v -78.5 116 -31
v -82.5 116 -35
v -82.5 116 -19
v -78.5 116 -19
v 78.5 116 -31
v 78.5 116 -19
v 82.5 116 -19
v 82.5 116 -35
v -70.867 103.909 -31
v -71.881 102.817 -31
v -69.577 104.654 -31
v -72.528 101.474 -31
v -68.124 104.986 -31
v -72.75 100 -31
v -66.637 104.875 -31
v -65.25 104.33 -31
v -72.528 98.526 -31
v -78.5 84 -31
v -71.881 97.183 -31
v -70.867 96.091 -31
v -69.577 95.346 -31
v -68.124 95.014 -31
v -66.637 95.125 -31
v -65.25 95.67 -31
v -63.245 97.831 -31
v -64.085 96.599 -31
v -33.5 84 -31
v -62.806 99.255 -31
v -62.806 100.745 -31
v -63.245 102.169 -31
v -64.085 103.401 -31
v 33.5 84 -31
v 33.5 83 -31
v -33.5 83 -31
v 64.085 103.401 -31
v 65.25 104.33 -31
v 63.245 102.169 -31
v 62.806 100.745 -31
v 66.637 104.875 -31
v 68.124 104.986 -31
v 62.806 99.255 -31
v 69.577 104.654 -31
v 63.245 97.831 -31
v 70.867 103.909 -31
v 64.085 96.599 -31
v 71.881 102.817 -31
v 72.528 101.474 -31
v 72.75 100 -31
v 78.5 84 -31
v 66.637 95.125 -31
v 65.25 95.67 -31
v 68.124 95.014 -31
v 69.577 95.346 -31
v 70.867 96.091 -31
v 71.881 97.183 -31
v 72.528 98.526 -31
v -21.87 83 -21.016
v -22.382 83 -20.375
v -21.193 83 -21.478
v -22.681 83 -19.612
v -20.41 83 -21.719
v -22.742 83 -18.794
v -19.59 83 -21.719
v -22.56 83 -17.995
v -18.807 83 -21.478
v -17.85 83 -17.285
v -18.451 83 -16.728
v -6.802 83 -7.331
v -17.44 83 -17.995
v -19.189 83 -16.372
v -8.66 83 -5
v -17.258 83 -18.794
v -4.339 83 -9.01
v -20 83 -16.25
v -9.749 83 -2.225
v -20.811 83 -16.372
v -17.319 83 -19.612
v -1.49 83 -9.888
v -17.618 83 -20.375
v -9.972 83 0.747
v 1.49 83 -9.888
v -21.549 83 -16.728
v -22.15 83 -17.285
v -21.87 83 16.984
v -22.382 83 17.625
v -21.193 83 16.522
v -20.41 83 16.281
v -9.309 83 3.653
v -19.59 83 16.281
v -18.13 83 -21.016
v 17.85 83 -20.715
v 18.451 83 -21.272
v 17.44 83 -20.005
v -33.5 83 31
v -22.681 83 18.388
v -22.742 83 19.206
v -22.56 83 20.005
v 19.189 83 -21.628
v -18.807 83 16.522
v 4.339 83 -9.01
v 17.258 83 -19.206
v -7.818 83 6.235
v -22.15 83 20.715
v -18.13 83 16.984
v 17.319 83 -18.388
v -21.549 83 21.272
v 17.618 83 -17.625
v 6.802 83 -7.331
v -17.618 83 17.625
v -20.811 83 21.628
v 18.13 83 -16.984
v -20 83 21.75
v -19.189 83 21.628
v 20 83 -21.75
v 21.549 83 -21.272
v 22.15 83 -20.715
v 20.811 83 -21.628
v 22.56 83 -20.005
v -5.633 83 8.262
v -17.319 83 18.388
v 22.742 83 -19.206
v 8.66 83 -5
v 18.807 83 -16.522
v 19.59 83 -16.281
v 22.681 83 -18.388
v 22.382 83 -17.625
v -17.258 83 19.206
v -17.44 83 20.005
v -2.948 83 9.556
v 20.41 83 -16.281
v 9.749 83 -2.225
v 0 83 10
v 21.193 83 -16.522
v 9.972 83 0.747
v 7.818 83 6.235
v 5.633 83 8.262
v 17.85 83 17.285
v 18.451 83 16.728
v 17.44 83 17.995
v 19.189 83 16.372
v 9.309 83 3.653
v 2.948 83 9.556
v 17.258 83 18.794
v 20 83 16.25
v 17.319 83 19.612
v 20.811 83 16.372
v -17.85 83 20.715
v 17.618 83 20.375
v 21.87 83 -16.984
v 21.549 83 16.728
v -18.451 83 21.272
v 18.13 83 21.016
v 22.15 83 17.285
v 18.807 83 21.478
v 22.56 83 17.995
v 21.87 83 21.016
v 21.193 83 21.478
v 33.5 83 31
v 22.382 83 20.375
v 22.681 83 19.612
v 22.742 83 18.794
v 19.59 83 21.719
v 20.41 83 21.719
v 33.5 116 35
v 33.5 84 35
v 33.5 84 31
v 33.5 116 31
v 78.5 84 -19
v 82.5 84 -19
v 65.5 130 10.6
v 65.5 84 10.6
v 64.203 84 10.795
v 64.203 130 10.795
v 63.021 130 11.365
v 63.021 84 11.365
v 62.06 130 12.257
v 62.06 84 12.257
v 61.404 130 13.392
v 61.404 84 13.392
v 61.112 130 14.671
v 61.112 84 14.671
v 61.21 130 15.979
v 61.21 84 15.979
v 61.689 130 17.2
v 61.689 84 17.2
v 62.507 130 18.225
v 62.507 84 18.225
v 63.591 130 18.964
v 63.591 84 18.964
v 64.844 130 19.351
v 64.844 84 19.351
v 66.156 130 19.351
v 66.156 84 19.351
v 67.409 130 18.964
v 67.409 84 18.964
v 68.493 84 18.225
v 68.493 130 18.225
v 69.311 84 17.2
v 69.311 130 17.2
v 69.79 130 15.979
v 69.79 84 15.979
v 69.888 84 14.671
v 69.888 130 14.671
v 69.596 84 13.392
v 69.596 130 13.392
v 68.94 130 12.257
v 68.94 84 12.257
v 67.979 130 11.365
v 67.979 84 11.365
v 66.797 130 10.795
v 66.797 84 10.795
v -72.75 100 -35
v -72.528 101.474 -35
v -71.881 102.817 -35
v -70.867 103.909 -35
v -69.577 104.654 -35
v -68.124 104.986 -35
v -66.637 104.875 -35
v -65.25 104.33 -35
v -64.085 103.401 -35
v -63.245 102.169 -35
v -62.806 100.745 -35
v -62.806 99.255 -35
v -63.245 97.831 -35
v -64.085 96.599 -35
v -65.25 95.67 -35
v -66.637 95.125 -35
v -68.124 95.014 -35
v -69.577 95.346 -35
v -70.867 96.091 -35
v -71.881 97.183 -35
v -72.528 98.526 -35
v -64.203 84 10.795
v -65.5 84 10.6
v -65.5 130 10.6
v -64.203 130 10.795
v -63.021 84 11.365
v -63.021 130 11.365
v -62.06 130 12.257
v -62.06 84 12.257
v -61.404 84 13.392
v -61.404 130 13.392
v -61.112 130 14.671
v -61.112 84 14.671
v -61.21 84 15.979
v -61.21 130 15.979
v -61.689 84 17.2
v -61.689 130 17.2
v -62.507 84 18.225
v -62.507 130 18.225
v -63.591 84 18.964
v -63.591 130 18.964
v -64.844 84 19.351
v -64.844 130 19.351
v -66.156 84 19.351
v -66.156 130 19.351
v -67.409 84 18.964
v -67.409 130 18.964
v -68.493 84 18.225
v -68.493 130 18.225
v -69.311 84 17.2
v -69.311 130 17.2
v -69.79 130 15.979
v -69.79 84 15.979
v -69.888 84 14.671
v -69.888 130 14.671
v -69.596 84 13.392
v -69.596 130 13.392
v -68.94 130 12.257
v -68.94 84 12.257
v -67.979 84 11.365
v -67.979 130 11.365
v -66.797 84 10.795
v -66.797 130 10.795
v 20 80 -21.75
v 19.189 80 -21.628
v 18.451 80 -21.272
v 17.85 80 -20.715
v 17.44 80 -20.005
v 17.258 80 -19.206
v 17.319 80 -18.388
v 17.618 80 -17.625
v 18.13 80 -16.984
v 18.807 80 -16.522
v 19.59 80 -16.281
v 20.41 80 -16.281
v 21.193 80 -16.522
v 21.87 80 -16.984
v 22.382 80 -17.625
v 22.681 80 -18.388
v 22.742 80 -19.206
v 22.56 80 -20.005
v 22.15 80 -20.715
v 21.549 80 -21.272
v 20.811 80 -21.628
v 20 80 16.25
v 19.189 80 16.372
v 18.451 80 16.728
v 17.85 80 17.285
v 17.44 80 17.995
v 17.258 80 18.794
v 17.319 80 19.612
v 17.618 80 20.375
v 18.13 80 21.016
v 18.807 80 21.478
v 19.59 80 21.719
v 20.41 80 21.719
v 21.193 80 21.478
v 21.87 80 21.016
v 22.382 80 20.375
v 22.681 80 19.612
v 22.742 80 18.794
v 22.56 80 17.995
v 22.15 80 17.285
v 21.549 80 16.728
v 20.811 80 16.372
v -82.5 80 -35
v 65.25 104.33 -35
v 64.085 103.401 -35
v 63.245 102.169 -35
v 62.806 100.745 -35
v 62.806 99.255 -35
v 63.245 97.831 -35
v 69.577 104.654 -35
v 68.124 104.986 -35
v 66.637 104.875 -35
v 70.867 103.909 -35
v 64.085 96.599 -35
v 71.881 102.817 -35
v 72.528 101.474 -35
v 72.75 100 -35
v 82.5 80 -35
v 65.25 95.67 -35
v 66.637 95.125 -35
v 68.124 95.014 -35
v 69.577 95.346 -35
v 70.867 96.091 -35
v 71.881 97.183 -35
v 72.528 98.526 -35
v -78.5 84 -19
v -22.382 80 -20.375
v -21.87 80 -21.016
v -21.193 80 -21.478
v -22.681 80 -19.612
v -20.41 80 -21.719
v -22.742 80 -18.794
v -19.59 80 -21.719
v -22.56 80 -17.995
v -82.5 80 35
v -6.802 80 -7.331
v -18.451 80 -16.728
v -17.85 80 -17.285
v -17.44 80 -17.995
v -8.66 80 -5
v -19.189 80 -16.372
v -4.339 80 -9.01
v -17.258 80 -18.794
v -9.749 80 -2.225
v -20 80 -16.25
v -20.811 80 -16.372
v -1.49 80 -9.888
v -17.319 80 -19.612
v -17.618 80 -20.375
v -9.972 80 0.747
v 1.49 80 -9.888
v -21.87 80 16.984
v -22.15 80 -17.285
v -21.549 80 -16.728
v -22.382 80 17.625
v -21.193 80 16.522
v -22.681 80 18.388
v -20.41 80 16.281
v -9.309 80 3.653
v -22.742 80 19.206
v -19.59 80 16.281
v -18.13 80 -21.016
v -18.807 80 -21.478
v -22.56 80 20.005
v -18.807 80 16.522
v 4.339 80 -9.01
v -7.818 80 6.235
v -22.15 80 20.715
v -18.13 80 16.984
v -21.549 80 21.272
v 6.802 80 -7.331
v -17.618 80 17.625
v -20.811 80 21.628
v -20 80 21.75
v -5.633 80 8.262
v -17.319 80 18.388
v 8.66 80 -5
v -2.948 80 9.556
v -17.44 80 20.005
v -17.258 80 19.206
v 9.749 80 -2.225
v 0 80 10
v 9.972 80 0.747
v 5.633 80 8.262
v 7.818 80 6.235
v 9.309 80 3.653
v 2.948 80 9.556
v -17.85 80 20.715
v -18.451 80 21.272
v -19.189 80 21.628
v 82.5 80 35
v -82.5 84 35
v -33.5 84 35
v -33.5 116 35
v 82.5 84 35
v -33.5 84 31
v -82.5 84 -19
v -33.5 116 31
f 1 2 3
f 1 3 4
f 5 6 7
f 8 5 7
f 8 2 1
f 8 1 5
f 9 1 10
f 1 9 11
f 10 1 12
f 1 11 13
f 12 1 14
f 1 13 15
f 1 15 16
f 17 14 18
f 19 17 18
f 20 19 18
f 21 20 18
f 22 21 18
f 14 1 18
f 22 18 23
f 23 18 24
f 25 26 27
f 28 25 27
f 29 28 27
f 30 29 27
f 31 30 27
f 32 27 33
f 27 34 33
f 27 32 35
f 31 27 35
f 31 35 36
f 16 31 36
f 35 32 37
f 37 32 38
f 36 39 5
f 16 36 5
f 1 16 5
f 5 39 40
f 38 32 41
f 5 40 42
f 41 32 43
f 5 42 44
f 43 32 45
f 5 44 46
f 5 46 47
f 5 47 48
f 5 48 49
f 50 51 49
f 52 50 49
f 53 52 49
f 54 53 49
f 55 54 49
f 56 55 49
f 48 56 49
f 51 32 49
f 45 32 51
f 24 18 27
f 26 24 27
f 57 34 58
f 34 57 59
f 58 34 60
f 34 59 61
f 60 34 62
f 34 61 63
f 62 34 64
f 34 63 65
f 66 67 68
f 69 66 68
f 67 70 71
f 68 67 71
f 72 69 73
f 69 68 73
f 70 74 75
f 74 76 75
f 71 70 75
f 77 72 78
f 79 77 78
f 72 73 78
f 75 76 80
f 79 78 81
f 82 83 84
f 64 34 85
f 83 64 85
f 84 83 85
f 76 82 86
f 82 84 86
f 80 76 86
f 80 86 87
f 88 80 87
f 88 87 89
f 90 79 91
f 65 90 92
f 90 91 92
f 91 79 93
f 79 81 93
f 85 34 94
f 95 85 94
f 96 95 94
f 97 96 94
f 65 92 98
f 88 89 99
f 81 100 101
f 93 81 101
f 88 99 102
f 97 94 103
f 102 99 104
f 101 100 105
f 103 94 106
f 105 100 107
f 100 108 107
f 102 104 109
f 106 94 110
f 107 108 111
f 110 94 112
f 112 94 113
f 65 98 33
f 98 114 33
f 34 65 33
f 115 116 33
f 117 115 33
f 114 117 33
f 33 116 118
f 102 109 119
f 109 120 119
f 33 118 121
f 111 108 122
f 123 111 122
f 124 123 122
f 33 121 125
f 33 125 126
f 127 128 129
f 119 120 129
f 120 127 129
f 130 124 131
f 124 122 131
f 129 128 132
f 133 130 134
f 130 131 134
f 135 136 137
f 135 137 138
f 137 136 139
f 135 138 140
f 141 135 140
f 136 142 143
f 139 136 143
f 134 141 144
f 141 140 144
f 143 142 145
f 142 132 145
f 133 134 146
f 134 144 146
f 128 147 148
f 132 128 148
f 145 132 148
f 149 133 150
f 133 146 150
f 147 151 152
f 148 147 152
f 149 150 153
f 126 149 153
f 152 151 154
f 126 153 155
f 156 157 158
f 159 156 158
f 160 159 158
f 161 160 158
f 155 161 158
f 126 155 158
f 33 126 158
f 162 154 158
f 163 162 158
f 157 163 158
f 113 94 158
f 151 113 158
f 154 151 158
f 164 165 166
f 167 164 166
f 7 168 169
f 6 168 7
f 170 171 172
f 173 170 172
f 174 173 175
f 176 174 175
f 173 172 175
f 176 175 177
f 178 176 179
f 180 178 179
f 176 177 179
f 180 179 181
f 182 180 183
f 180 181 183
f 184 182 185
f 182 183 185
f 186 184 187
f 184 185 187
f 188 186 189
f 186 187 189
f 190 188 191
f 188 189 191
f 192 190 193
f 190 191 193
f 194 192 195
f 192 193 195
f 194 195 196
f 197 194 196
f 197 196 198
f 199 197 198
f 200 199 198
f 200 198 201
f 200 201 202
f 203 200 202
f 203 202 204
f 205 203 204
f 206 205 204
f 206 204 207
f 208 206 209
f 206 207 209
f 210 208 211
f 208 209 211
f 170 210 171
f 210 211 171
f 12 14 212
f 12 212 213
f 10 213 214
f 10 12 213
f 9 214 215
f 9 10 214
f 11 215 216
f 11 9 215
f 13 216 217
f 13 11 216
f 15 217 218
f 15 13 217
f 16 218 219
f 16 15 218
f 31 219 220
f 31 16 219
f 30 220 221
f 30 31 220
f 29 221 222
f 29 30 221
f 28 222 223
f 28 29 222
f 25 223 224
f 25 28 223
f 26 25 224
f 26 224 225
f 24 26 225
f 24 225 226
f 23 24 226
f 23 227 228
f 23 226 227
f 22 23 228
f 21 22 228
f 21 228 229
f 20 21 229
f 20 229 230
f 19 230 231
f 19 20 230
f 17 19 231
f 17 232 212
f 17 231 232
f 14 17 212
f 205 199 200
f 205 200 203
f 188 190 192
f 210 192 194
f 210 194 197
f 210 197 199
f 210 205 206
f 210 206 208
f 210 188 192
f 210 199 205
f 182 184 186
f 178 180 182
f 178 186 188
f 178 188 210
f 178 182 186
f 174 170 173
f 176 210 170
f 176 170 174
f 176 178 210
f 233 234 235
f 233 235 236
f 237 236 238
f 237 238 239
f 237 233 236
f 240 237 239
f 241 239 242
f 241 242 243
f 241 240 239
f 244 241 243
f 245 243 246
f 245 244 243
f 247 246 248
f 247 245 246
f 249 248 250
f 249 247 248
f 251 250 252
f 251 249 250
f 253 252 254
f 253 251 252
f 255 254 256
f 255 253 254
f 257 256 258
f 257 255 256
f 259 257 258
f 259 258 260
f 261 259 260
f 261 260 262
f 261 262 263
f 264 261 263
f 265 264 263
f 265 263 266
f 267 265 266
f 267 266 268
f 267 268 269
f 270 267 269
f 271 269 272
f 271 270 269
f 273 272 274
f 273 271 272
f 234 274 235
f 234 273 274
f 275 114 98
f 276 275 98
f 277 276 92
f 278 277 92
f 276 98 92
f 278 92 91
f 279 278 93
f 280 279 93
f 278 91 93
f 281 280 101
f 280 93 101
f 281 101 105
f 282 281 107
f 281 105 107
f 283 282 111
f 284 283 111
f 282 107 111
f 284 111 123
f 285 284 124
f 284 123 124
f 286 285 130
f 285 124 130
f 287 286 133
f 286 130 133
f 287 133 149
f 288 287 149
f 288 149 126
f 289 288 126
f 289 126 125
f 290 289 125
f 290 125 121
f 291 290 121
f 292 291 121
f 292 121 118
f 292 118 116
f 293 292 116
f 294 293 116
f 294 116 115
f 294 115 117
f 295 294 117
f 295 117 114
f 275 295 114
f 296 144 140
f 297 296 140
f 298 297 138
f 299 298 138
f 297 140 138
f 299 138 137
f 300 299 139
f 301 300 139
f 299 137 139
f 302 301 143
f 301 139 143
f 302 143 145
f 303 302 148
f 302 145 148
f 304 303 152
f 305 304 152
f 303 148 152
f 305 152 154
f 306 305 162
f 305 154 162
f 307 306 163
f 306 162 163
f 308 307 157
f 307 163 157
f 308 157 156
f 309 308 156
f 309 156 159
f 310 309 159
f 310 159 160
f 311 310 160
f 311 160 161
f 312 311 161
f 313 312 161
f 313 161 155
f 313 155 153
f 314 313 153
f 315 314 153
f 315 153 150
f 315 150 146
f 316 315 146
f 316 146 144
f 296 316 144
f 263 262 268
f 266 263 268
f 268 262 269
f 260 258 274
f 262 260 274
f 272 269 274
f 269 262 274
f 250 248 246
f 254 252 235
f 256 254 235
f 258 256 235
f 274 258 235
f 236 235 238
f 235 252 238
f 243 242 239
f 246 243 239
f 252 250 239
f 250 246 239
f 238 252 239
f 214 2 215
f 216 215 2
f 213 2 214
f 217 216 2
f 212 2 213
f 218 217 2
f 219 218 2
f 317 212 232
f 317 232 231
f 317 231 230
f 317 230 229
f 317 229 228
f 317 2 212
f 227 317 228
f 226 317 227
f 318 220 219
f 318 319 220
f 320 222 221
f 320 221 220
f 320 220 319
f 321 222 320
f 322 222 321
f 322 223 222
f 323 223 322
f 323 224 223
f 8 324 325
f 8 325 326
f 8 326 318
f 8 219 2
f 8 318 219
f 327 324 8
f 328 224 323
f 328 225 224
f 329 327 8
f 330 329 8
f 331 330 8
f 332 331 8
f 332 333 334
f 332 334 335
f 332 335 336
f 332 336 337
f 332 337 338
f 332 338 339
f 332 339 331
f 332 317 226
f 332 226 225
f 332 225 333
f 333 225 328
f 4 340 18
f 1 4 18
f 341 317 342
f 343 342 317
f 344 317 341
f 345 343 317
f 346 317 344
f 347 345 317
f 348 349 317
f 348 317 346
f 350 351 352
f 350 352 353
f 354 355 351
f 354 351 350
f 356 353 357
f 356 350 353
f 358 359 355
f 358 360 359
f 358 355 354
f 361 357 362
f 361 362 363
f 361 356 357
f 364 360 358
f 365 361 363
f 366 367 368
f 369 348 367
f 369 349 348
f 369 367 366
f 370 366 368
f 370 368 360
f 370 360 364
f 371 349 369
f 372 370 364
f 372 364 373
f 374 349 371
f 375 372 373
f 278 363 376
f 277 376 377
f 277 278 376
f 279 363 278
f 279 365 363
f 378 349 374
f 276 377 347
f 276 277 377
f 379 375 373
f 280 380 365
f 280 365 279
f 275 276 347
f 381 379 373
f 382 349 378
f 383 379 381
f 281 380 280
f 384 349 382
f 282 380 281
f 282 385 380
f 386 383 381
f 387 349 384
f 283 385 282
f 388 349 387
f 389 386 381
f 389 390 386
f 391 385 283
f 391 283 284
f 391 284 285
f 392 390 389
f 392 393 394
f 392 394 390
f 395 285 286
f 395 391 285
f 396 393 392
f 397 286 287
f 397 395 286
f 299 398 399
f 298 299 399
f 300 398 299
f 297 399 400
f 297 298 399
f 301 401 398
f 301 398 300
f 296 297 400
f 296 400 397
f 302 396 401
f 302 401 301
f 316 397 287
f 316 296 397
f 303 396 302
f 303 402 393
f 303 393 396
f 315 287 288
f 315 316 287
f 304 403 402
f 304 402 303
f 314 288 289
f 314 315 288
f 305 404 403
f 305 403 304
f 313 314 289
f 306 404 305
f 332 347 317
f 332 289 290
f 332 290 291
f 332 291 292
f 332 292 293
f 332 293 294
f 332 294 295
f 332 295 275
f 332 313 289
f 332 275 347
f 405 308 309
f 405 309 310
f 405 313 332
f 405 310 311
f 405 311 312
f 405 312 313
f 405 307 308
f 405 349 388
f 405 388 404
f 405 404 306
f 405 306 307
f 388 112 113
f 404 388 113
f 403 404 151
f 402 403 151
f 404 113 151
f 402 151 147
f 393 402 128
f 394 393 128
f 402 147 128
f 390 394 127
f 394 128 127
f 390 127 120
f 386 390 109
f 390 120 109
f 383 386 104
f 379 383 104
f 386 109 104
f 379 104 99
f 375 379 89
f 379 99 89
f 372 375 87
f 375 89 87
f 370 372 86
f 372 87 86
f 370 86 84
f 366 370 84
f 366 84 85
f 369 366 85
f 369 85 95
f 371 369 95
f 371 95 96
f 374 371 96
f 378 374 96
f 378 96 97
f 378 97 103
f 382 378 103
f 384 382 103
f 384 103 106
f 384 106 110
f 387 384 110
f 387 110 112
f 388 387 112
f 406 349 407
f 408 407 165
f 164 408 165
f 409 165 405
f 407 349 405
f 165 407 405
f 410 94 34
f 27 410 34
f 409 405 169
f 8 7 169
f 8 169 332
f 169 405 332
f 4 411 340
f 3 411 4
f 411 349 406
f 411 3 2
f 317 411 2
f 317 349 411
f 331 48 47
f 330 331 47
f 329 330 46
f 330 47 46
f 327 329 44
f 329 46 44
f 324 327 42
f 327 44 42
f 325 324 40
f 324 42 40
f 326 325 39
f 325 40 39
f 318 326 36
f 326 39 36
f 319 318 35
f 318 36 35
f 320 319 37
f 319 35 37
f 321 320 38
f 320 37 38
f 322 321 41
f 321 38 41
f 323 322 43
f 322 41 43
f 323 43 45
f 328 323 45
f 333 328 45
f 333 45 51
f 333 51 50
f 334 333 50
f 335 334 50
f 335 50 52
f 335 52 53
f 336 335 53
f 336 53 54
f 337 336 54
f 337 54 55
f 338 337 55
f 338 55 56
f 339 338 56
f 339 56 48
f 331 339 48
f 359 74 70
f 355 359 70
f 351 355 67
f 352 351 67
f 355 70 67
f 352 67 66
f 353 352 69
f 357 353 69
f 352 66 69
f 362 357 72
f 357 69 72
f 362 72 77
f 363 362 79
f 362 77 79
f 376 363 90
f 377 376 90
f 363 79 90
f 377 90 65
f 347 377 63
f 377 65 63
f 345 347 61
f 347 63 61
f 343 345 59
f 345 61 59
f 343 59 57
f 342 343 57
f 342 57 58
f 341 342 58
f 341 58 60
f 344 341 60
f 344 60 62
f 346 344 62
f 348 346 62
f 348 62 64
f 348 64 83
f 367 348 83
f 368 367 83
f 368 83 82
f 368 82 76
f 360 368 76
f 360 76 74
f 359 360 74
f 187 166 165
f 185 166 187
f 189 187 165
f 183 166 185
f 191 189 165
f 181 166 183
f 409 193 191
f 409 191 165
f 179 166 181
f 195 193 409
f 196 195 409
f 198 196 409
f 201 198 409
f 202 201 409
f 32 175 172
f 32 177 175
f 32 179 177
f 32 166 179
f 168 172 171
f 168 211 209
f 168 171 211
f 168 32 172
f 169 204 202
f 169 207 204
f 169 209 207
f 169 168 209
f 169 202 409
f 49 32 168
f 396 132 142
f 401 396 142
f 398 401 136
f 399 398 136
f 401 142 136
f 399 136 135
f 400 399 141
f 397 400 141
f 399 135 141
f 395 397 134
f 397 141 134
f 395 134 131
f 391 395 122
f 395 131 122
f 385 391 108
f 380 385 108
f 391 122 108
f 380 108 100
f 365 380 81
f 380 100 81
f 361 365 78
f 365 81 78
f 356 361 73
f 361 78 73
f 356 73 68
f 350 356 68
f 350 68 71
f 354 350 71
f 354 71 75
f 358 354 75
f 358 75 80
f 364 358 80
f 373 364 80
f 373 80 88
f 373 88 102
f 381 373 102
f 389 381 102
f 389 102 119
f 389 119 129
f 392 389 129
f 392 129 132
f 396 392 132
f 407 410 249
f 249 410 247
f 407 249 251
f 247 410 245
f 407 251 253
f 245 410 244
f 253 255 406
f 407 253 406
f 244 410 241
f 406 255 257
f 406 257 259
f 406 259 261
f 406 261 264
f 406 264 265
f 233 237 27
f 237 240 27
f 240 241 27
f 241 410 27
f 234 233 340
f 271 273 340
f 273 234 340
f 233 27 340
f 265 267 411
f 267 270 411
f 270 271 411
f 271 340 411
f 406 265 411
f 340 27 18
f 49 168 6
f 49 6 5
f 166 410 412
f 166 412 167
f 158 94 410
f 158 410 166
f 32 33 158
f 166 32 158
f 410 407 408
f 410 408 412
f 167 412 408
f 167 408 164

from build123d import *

# Parameters (mm, degrees)
SKETCH1_W                 = 75
SKETCH1_H                 = 40
SKETCH1_R                 = 5
SKETCH1_R_2               = 1.7
SKETCH1_W_2               = 10
SKETCH1_H_2               = 20
BOSS_EXTRUDE1_DEPTH       = 3
CUT_EXTRUDE1_DEPTH        = 43.605750786
CUT_EXTRUDE1_DEPTH_BACK   = 43.605750786
SKETCH2_W                 = 67
SKETCH2_H                 = 28
BOSS_EXTRUDE3_DEPTH       = 110
BOSS_EXTRUDE3_DEPTH_BACK  = 3
SKETCH6_W                 = 67
SKETCH6_H                 = 11
CUT_EXTRUDE4_DEPTH        = 122.372360939
SKETCH7_W                 = 70
SKETCH7_H                 = 37
BOSS_EXTRUDE4_DEPTH       = 45
SKETCH8_W                 = 45
SKETCH8_H                 = 62
CUT_EXTRUDE6_DEPTH        = 29
SKETCH11_W                = 45
SKETCH11_H                = 4
CUT_EXTRUDE9_DEPTH        = 157.445677473
SKETCH9_W                 = 38
SKETCH9_H                 = 28.5
CUT_EXTRUDE10_DEPTH       = 204.024629048
SKETCH13_W                = 5
SKETCH13_H                = 38
BOSS_EXTRUDE5_DEPTH       = 32
SKETCH14_R                = 5
SKETCH14_R_2              = 1.7
CUT_EXTRUDE11_DEPTH       = 32
SKETCH15_W                = 165
SKETCH15_H                = 70
SKETCH15_W_2              = 157
SKETCH15_H_2              = 62
BOSS_EXTRUDE6_DEPTH       = 3
SKETCH16_W                = 20
SKETCH16_H                = 4.820648258
CUT_EXTRUDE12_DEPTH       = 159.626132778
SKETCH18_R                = 5
CUT_EXTRUDE14_DEPTH       = 159.626132778
MIRROR6_COPY_1_SKETCH_W   = 5
MIRROR6_COPY_1_SKETCH_H   = 38
MIRROR6_COPY_1_DEPTH      = 32
MIRROR6_COPY_2_SKETCH_R   = 5
MIRROR6_COPY_2_SKETCH_R_2 = 1.7
MIRROR6_COPY_2_DEPTH      = 32
SKETCH19_W                = 38
SKETCH19_H                = 3.5
CUT_EXTRUDE15_DEPTH       = 10
SKETCH20_R                = 1.2
CUT_EXTRUDE16_DEPTH       = 10
SKETCH21_W                = 10
SKETCH21_H                = 80
CUT_EXTRUDE17_DEPTH       = 184.330984833
SKETCH22_W                = 55
SKETCH22_H                = 80
CUT_EXTRUDE18_DEPTH       = 184.330984833
SKETCH23_W                = 67
SKETCH23_H                = 62
BOSS_EXTRUDE7_DEPTH       = 3
SKETCH24_R                = 10
SKETCH24_R_2              = 2.75
CUT_EXTRUDE19_DEPTH       = 111.707949127
SKETCH25_W                = 38
SKETCH25_H                = 64
CUT_EXTRUDE20_DEPTH       = 115
SKETCH26_W                = 49
SKETCH26_H                = 35
CUT_EXTRUDE21_DEPTH       = 32
SKETCH27_R                = 4.4
BOSS_EXTRUDE8_DEPTH       = 46


with BuildPart() as part:
    # Sketch1 → Boss-Extrude1 (new body)
    with BuildSketch(Plane(origin=(0, 0, 0), x_dir=(1, 0, 0), z_dir=(0, 1, 0))):
        Rectangle(SKETCH1_W, SKETCH1_H)
        with Locations(Location((-21, 0, 0), (0, 0, 270))):
            Circle(SKETCH1_R, mode=Mode.SUBTRACT)
        with Locations(Location((-30, 8.25, 0), (0, 0, 270))):
            Circle(SKETCH1_R_2, mode=Mode.SUBTRACT)
        with Locations(Location((-12, 8.25, 0), (0, 0, 270))):
            Circle(SKETCH1_R_2, mode=Mode.SUBTRACT)
        with Locations(Location((-12, -8.25, 0), (0, 0, 270))):
            Circle(SKETCH1_R_2, mode=Mode.SUBTRACT)
        with Locations(Location((-30, -8.25, 0), (0, 0, 270))):
            Circle(SKETCH1_R_2, mode=Mode.SUBTRACT)
        with Locations(Location((12, 8.25, 0), (0, 0, 90))):
            Circle(SKETCH1_R_2, mode=Mode.SUBTRACT)
        with Locations(Location((12, -8.25, 0), (0, 0, 90))):
            Circle(SKETCH1_R_2, mode=Mode.SUBTRACT)
        with Locations(Location((21, 0, 0), (0, 0, 90))):
            Circle(SKETCH1_R, mode=Mode.SUBTRACT)
        with Locations(Location((30, -8.25, 0), (0, 0, 90))):
            Circle(SKETCH1_R_2, mode=Mode.SUBTRACT)
        with Locations(Location((30, 8.25, 0), (0, 0, 90))):
            Circle(SKETCH1_R_2, mode=Mode.SUBTRACT)
        Rectangle(SKETCH1_W_2, SKETCH1_H_2, mode=Mode.SUBTRACT)
    extrude(amount=BOSS_EXTRUDE1_DEPTH)

    # Sketch2 → Cut-Extrude1 (cut, two sides: drawn at the far end of the back side and taken through both)
    with BuildSketch(Plane(origin=(0, 3, 0), x_dir=(1, 0, 0), z_dir=(0, 1, 0)).offset(-CUT_EXTRUDE1_DEPTH_BACK)):
        Rectangle(SKETCH2_W, SKETCH2_H)
    extrude(amount=CUT_EXTRUDE1_DEPTH + CUT_EXTRUDE1_DEPTH_BACK, mode=Mode.SUBTRACT)

    # Sketch3 → Boss-Extrude3 (add, two sides: drawn at the far end of the back side and taken through both)
    with BuildSketch(Plane(origin=(0, 3, 0), x_dir=(1, 0, 0), z_dir=(0, 1, 0)).offset(-BOSS_EXTRUDE3_DEPTH_BACK)):
        Polygon((37.5, -35), (37.5, -20), (33.5, -20), (-33.5, -20), (-37.5, -20), (-37.5, -35), align=None)
        Polygon((33.5, 20), (37.5, 20), (37.5, 35), (-37.5, 35), (-37.5, 20), (-33.5, 20), align=None)
        Polygon((37.5, -20), (37.5, 20), (33.5, 20), (33.5, 14), (33.5, -14), (33.5, -20), align=None)
        Polygon((-33.5, 14), (-33.5, 20), (-37.5, 20), (-37.5, -20), (-33.5, -20), (-33.5, -14), align=None)
    extrude(amount=BOSS_EXTRUDE3_DEPTH + BOSS_EXTRUDE3_DEPTH_BACK)

    # Sketch6 → Cut-Extrude4 (cut, through all)
    with BuildSketch(Plane(origin=(0, 3, 0), x_dir=(1, 0, 0), z_dir=(0, 1, 0))):
        with Locations((0, -25.5)):
            Rectangle(SKETCH6_W, SKETCH6_H)
        with Locations((0, 25.5)):
            Rectangle(SKETCH6_W, SKETCH6_H)
    extrude(amount=CUT_EXTRUDE4_DEPTH, mode=Mode.SUBTRACT)

    # Sketch7 → Boss-Extrude4 (add)
    with BuildSketch(Plane.ZY.offset(37.5)):
        with Locations((0, 94.5)):
            Rectangle(SKETCH7_W, SKETCH7_H)
    boss_extrude4 = extrude(amount=BOSS_EXTRUDE4_DEPTH)

    # Mirror2: Boss-Extrude4 across plane
    add(boss_extrude4.mirror(Plane(origin=(0, 0, 0), x_dir=(0, 0, 1), z_dir=(1, 0, 0))))

    # Sketch8 → Cut-Extrude6 (cut)
    with BuildSketch(Plane(origin=(0, 113, 0), x_dir=(1, 0, 0), z_dir=(0, 1, 0))):
        with Locations((-56, 0)):
            Rectangle(SKETCH8_W, SKETCH8_H)
        with Locations((56, 0)):
            Rectangle(SKETCH8_W, SKETCH8_H)
    extrude(amount=-CUT_EXTRUDE6_DEPTH, mode=Mode.SUBTRACT)

    # Sketch11 → Cut-Extrude9 (cut, through all)
    with BuildSketch(Plane.XY.offset(35)):
        with Locations((-60, 78)):
            Rectangle(SKETCH11_W, SKETCH11_H)
        with Locations((60, 78)):
            Rectangle(SKETCH11_W, SKETCH11_H)
    extrude(amount=-CUT_EXTRUDE9_DEPTH, mode=Mode.SUBTRACT)

    # Sketch9 → Cut-Extrude10 (cut, through all)
    with BuildSketch(Plane.ZY.offset(82.5)):
        with Locations((0, 98.25)):
            Rectangle(SKETCH9_W, SKETCH9_H)
    extrude(amount=-CUT_EXTRUDE10_DEPTH, mode=Mode.SUBTRACT)

    # Sketch13 → Boss-Extrude5 (add)
    with BuildSketch(Plane(origin=(0, 84, 0), x_dir=(1, 0, 0), z_dir=(0, 1, 0))):
        with Locations((-54.5, 0)):
            Rectangle(SKETCH13_W, SKETCH13_H)
    boss_extrude5 = extrude(amount=BOSS_EXTRUDE5_DEPTH)

    # Sketch14 → Cut-Extrude11 (cut)
    with BuildSketch(Plane.ZY.offset(57)):
        with Locations((0, 98.25)):
            Circle(SKETCH14_R)
        with Locations((-9, 106.5)):
            Circle(SKETCH14_R_2)
        with Locations((9, 106.5)):
            Circle(SKETCH14_R_2)
        with Locations((9, 90)):
            Circle(SKETCH14_R_2)
        with Locations((-9, 90)):
            Circle(SKETCH14_R_2)
    cut_extrude11 = extrude(amount=-CUT_EXTRUDE11_DEPTH, mode=Mode.SUBTRACT)

    # Mirror4: Boss-Extrude5, Cut-Extrude11 across plane
    add(boss_extrude5.mirror(Plane(origin=(0, 0, 0), x_dir=(0, 0, 1), z_dir=(1, 0, 0))))
    add(cut_extrude11.mirror(Plane(origin=(0, 0, 0), x_dir=(0, 0, 1), z_dir=(1, 0, 0))), mode=Mode.SUBTRACT)

    # Sketch15 → Boss-Extrude6 (add)
    with BuildSketch(Plane(origin=(0, 113, 0), x_dir=(1, 0, 0), z_dir=(0, 1, 0))):
        Rectangle(SKETCH15_W, SKETCH15_H)
        Rectangle(SKETCH15_W_2, SKETCH15_H_2, mode=Mode.SUBTRACT)
    extrude(amount=BOSS_EXTRUDE6_DEPTH)

    # Sketch16 → Cut-Extrude12 (cut, through all)
    with BuildSketch(Plane.XY.offset(35)):
        with Locations((0, 11.636111214)):
            Rectangle(SKETCH16_W, SKETCH16_H)
    extrude(amount=-CUT_EXTRUDE12_DEPTH, mode=Mode.SUBTRACT)

    # Sketch18 → Cut-Extrude14 (cut, through all)
    with BuildSketch(Plane.XY.offset(35)):
        with Locations((67.75, 100)):
            Circle(SKETCH18_R)
    cut_extrude14 = extrude(amount=-CUT_EXTRUDE14_DEPTH, mode=Mode.SUBTRACT)

    # Mirror5: Cut-Extrude14 across plane
    add(cut_extrude14.mirror(Plane(origin=(0, 0, 0), x_dir=(0, 0, 1), z_dir=(1, 0, 0))), mode=Mode.SUBTRACT)

    # Mirror6: Boss-Extrude5, Cut-Extrude11 across plane
    add(boss_extrude5.mirror(Plane.ZX.offset(116)))
    add(cut_extrude11.mirror(Plane.ZX.offset(116)), mode=Mode.SUBTRACT)

    # Mirror6 copy 1 sketch → Mirror6 copy 1 (add)
    with BuildSketch(Plane(origin=(0, 148, 0), x_dir=(-1, 0, 0), z_dir=(0, -1, 0))):
        with Locations((-54.5, 0)):
            Rectangle(MIRROR6_COPY_1_SKETCH_W, MIRROR6_COPY_1_SKETCH_H)
    extrude(amount=MIRROR6_COPY_1_DEPTH)

    # Mirror6 copy 2 sketch → Mirror6 copy 2 (cut)
    with BuildSketch(Plane(origin=(57, 232, 0), x_dir=(0, 0, 1), z_dir=(1, 0, 0))):
        with Locations((0, 98.25)):
            Circle(MIRROR6_COPY_2_SKETCH_R)
        with Locations((-9, 106.5)):
            Circle(MIRROR6_COPY_2_SKETCH_R_2)
        with Locations((9, 106.5)):
            Circle(MIRROR6_COPY_2_SKETCH_R_2)
        with Locations((9, 90)):
            Circle(MIRROR6_COPY_2_SKETCH_R_2)
        with Locations((-9, 90)):
            Circle(MIRROR6_COPY_2_SKETCH_R_2)
    extrude(amount=-MIRROR6_COPY_2_DEPTH, mode=Mode.SUBTRACT)

    # Sketch19 → Cut-Extrude15 (cut)
    with BuildSketch(Plane(origin=(82.5, 0, 0), x_dir=(0, 0, -1), z_dir=(1, 0, 0))):
        with Locations((0, 114.25)):
            Rectangle(SKETCH19_W, SKETCH19_H)
    cut_extrude15 = extrude(amount=-CUT_EXTRUDE15_DEPTH, mode=Mode.SUBTRACT)

    # Mirror7: Cut-Extrude15 across plane
    add(cut_extrude15.mirror(Plane(origin=(0, 0, 0), x_dir=(0, 0, 1), z_dir=(1, 0, 0))), mode=Mode.SUBTRACT)

    # Sketch20 → Cut-Extrude16 (cut)
    with BuildSketch(Plane(origin=(0, 3, 0), x_dir=(1, 0, 0), z_dir=(0, 1, 0))):
        with Locations(Location((-24, 17.5, 0), (0, 0, 270))):
            Circle(SKETCH20_R)
        with Locations(Location((-12, 17.5, 0), (0, 0, 270))):
            Circle(SKETCH20_R)
        with Locations(Location((12, 17.5, 0), (0, 0, 270))):
            Circle(SKETCH20_R)
        with Locations(Location((-24, -17.5, 0), (0, 0, 270))):
            Circle(SKETCH20_R)
        with Locations(Location((-12, -17.5, 0), (0, 0, 270))):
            Circle(SKETCH20_R)
        with Locations(Location((24, 17.5, 0), (0, 0, 270))):
            Circle(SKETCH20_R)
        with Locations(Location((12, -17.5, 0), (0, 0, 270))):
            Circle(SKETCH20_R)
        with Locations(Location((24, -17.5, 0), (0, 0, 270))):
            Circle(SKETCH20_R)
    extrude(amount=-CUT_EXTRUDE16_DEPTH, mode=Mode.SUBTRACT)

    # Sketch21 → Cut-Extrude17 (cut, through all)
    with BuildSketch(Plane.XY.offset(35)):
        with Locations((32.5, 40)):
            Rectangle(SKETCH21_W, SKETCH21_H)
        with Locations((-32.5, 40)):
            Rectangle(SKETCH21_W, SKETCH21_H)
    extrude(amount=-CUT_EXTRUDE17_DEPTH, mode=Mode.SUBTRACT)

    # Sketch22 → Cut-Extrude18 (cut, through all)
    with BuildSketch(Plane.XY.offset(35)):
        with Locations((0, 40)):
            Rectangle(SKETCH22_W, SKETCH22_H)
    extrude(amount=-CUT_EXTRUDE18_DEPTH, mode=Mode.SUBTRACT)

    # Sketch23 → Boss-Extrude7 (add)
    with BuildSketch(Plane.XZ.offset(-80)):
        Rectangle(SKETCH23_W, SKETCH23_H)
    extrude(amount=-BOSS_EXTRUDE7_DEPTH)

    # Sketch24 → Cut-Extrude19 (cut, through all)
    with BuildSketch(Plane(origin=(0, 83, 0), x_dir=(1, 0, 0), z_dir=(0, 1, 0))):
        with Locations(Location((0, 0, 0), (0, 0, 270))):
            Circle(SKETCH24_R)
        with Locations(Location((-20, 19, 0), (0, 0, 270))):
            Circle(SKETCH24_R_2)
        with Locations(Location((-20, -19, 0), (0, 0, 270))):
            Circle(SKETCH24_R_2)
        with Locations(Location((20, -19, 0), (0, 0, 90))):
            Circle(SKETCH24_R_2)
        with Locations(Location((20, 19, 0), (0, 0, 90))):
            Circle(SKETCH24_R_2)
    extrude(amount=-CUT_EXTRUDE19_DEPTH, mode=Mode.SUBTRACT)

    # Sketch25 → Cut-Extrude20 (cut)
    with BuildSketch(Plane(origin=(57, 0, 0), x_dir=(0, 0, -1), z_dir=(1, 0, 0))):
        with Locations((0, 116)):
            Rectangle(SKETCH25_W, SKETCH25_H)
    extrude(amount=-CUT_EXTRUDE20_DEPTH, mode=Mode.SUBTRACT)

    # Sketch26 → Cut-Extrude21 (cut)
    with BuildSketch(Plane(origin=(0, 116, 0), x_dir=(1, 0, 0), z_dir=(0, 1, 0))):
        with Locations((58, -17.5)):
            Rectangle(SKETCH26_W, SKETCH26_H)
    cut_extrude21 = extrude(amount=-CUT_EXTRUDE21_DEPTH, mode=Mode.SUBTRACT)

    # Mirror8: Cut-Extrude21 across plane
    add(cut_extrude21.mirror(Plane(origin=(0, 0, 0), x_dir=(0, 0, 1), z_dir=(1, 0, 0))), mode=Mode.SUBTRACT)

    # Sketch27 → Boss-Extrude8 (add)
    with BuildSketch(Plane(origin=(0, 84, 0), x_dir=(1, 0, 0), z_dir=(0, 1, 0))):
        with Locations(Location((65.5, -15, 0), (0, 0, 90))):
            Circle(SKETCH27_R)
    boss_extrude8 = extrude(amount=BOSS_EXTRUDE8_DEPTH)

    # Mirror9: Boss-Extrude8 across plane
    add(boss_extrude8.mirror(Plane(origin=(0, 0, 0), x_dir=(0, 0, 1), z_dir=(1, 0, 0))))


solid = part.part
